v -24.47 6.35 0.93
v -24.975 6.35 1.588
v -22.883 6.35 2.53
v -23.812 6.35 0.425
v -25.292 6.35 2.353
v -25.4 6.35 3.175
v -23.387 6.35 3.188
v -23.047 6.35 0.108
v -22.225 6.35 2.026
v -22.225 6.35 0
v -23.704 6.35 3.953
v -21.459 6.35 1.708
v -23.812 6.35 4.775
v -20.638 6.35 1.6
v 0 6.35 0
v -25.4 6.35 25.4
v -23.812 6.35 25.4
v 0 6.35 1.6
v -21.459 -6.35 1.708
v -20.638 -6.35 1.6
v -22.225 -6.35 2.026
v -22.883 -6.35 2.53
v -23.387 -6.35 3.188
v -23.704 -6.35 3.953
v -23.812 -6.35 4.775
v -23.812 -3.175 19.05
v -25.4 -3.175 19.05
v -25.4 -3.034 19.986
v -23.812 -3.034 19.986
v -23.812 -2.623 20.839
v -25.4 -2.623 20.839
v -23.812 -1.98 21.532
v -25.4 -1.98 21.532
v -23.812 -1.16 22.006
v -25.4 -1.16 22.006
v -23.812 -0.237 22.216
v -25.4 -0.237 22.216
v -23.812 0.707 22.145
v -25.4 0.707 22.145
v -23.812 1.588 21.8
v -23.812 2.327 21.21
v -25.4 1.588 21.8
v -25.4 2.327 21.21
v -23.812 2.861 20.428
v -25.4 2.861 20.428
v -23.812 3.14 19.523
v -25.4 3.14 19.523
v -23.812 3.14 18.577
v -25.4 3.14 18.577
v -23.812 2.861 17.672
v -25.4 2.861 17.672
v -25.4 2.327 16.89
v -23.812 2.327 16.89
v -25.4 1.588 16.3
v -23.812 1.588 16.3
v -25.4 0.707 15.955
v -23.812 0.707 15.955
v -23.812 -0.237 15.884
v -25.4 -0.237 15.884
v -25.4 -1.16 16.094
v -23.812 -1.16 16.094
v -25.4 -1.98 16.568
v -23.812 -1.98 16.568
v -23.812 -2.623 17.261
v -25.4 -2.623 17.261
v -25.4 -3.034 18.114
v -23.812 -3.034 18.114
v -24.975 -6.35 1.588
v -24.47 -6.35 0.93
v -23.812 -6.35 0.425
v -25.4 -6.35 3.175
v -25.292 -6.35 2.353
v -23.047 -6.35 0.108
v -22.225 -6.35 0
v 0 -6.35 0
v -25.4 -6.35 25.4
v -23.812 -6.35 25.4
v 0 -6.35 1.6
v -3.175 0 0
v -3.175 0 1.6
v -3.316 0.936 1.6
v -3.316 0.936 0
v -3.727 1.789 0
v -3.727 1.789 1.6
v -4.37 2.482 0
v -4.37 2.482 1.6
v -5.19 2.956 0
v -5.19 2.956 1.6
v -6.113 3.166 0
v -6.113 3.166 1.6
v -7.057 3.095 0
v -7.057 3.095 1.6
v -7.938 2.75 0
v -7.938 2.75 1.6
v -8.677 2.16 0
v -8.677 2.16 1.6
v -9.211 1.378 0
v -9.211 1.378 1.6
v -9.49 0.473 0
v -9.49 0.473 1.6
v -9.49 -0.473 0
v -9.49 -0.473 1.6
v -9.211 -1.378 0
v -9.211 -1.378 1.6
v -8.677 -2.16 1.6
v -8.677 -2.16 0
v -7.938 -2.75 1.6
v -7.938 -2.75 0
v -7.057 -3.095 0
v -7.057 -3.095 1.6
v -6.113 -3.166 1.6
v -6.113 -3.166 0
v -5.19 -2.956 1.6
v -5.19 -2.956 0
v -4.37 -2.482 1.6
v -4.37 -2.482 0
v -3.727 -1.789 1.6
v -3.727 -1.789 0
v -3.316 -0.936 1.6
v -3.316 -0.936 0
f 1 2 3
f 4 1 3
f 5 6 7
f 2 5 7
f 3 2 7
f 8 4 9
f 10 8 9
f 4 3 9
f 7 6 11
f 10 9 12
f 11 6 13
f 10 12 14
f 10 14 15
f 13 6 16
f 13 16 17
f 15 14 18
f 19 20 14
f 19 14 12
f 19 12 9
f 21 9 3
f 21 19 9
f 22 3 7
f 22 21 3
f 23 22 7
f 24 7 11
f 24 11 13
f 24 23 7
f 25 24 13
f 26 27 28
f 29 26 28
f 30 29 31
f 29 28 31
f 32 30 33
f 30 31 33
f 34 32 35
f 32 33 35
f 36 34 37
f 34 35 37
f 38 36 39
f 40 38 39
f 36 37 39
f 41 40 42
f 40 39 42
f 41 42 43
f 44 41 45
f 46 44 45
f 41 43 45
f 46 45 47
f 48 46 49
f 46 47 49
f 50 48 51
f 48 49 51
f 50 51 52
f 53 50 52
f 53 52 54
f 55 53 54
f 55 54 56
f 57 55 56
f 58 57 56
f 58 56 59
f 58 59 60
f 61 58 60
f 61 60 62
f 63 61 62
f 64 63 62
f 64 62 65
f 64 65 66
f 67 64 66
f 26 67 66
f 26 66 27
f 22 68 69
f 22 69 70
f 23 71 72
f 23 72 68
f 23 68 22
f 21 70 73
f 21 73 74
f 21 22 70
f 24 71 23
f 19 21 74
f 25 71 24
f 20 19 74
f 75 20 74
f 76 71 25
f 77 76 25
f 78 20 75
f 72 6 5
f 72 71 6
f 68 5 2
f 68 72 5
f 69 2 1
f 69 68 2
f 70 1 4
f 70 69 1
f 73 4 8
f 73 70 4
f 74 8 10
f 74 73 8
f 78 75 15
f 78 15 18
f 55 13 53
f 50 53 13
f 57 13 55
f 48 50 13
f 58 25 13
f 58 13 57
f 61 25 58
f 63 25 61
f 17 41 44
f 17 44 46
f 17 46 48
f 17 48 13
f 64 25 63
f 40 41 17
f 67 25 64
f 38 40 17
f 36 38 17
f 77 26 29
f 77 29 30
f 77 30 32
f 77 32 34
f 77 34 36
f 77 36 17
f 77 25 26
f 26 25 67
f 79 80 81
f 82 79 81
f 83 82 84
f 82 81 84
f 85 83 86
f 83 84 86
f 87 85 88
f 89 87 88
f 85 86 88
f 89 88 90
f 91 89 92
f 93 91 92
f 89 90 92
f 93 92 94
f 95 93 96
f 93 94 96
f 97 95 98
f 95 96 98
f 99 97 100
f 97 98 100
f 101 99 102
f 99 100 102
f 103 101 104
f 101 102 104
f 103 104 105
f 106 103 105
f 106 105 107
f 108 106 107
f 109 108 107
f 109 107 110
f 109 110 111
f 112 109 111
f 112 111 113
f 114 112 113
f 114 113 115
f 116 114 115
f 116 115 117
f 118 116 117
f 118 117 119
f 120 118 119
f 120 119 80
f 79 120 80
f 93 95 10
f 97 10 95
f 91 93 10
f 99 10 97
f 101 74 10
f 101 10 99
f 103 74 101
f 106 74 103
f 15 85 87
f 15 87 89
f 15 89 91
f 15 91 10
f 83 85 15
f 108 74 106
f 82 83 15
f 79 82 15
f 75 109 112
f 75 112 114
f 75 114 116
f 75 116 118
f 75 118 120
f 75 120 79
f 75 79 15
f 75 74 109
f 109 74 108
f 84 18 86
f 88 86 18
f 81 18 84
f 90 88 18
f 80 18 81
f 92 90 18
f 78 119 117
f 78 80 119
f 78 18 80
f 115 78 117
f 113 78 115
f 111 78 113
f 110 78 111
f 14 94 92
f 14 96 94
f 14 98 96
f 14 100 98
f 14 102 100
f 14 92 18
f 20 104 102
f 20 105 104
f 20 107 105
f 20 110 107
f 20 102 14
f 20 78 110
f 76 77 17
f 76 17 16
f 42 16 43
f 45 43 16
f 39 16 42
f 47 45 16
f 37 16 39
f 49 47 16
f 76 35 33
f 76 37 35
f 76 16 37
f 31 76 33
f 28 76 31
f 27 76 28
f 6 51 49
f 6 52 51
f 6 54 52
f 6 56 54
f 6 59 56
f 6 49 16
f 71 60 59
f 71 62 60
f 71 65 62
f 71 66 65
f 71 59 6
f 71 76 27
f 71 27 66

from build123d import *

# Parameters (mm, degrees)
F1_DEPTH = 6.35
F2_R     = 3.175
F3_DEPTH = 5.08
F4_R     = 3.175
F5_DEPTH = 5.08


with BuildPart() as f1:
    # F0 (on Front) → F1 (new body, symmetric)
    with BuildSketch(Plane.XZ):
        with BuildLine():
            Line((-22.225, 0), (0, 0))
            Line((0, 0), (0, 1.6002))
            Line((0, 1.6002), (-20.6375, 1.6002))
            ThreePointArc((-20.6375, 1.6002), (-22.882564, 2.530136), (-23.8125, 4.7752))
            Line((-23.8125, 4.7752), (-23.8125, 25.4))
            Line((-23.8125, 25.4), (-25.4, 25.4))
            Line((-25.4, 25.4), (-25.4, 3.175))
            ThreePointArc((-25.4, 3.175), (-24.470064, 0.929936), (-22.225, 0))
        make_face()
    extrude(amount=F1_DEPTH, both=True)

    # F2 (on face) → F3 (cut)
    with BuildSketch(Plane(origin=(-25.4, 0, 0), x_dir=(0, -1, 0), z_dir=(-1, 0, 0))):
        with Locations((0, 19.05)):
            Circle(F2_R)
    extrude(amount=-F3_DEPTH, mode=Mode.SUBTRACT)

    # F4 (on face) → F5 (cut)
    with BuildSketch(Plane.XY.offset(1.6002)):
        with Locations((-6.35, 0)):
            Circle(F4_R)
    extrude(amount=-F5_DEPTH, mode=Mode.SUBTRACT)


solid = f1.part
